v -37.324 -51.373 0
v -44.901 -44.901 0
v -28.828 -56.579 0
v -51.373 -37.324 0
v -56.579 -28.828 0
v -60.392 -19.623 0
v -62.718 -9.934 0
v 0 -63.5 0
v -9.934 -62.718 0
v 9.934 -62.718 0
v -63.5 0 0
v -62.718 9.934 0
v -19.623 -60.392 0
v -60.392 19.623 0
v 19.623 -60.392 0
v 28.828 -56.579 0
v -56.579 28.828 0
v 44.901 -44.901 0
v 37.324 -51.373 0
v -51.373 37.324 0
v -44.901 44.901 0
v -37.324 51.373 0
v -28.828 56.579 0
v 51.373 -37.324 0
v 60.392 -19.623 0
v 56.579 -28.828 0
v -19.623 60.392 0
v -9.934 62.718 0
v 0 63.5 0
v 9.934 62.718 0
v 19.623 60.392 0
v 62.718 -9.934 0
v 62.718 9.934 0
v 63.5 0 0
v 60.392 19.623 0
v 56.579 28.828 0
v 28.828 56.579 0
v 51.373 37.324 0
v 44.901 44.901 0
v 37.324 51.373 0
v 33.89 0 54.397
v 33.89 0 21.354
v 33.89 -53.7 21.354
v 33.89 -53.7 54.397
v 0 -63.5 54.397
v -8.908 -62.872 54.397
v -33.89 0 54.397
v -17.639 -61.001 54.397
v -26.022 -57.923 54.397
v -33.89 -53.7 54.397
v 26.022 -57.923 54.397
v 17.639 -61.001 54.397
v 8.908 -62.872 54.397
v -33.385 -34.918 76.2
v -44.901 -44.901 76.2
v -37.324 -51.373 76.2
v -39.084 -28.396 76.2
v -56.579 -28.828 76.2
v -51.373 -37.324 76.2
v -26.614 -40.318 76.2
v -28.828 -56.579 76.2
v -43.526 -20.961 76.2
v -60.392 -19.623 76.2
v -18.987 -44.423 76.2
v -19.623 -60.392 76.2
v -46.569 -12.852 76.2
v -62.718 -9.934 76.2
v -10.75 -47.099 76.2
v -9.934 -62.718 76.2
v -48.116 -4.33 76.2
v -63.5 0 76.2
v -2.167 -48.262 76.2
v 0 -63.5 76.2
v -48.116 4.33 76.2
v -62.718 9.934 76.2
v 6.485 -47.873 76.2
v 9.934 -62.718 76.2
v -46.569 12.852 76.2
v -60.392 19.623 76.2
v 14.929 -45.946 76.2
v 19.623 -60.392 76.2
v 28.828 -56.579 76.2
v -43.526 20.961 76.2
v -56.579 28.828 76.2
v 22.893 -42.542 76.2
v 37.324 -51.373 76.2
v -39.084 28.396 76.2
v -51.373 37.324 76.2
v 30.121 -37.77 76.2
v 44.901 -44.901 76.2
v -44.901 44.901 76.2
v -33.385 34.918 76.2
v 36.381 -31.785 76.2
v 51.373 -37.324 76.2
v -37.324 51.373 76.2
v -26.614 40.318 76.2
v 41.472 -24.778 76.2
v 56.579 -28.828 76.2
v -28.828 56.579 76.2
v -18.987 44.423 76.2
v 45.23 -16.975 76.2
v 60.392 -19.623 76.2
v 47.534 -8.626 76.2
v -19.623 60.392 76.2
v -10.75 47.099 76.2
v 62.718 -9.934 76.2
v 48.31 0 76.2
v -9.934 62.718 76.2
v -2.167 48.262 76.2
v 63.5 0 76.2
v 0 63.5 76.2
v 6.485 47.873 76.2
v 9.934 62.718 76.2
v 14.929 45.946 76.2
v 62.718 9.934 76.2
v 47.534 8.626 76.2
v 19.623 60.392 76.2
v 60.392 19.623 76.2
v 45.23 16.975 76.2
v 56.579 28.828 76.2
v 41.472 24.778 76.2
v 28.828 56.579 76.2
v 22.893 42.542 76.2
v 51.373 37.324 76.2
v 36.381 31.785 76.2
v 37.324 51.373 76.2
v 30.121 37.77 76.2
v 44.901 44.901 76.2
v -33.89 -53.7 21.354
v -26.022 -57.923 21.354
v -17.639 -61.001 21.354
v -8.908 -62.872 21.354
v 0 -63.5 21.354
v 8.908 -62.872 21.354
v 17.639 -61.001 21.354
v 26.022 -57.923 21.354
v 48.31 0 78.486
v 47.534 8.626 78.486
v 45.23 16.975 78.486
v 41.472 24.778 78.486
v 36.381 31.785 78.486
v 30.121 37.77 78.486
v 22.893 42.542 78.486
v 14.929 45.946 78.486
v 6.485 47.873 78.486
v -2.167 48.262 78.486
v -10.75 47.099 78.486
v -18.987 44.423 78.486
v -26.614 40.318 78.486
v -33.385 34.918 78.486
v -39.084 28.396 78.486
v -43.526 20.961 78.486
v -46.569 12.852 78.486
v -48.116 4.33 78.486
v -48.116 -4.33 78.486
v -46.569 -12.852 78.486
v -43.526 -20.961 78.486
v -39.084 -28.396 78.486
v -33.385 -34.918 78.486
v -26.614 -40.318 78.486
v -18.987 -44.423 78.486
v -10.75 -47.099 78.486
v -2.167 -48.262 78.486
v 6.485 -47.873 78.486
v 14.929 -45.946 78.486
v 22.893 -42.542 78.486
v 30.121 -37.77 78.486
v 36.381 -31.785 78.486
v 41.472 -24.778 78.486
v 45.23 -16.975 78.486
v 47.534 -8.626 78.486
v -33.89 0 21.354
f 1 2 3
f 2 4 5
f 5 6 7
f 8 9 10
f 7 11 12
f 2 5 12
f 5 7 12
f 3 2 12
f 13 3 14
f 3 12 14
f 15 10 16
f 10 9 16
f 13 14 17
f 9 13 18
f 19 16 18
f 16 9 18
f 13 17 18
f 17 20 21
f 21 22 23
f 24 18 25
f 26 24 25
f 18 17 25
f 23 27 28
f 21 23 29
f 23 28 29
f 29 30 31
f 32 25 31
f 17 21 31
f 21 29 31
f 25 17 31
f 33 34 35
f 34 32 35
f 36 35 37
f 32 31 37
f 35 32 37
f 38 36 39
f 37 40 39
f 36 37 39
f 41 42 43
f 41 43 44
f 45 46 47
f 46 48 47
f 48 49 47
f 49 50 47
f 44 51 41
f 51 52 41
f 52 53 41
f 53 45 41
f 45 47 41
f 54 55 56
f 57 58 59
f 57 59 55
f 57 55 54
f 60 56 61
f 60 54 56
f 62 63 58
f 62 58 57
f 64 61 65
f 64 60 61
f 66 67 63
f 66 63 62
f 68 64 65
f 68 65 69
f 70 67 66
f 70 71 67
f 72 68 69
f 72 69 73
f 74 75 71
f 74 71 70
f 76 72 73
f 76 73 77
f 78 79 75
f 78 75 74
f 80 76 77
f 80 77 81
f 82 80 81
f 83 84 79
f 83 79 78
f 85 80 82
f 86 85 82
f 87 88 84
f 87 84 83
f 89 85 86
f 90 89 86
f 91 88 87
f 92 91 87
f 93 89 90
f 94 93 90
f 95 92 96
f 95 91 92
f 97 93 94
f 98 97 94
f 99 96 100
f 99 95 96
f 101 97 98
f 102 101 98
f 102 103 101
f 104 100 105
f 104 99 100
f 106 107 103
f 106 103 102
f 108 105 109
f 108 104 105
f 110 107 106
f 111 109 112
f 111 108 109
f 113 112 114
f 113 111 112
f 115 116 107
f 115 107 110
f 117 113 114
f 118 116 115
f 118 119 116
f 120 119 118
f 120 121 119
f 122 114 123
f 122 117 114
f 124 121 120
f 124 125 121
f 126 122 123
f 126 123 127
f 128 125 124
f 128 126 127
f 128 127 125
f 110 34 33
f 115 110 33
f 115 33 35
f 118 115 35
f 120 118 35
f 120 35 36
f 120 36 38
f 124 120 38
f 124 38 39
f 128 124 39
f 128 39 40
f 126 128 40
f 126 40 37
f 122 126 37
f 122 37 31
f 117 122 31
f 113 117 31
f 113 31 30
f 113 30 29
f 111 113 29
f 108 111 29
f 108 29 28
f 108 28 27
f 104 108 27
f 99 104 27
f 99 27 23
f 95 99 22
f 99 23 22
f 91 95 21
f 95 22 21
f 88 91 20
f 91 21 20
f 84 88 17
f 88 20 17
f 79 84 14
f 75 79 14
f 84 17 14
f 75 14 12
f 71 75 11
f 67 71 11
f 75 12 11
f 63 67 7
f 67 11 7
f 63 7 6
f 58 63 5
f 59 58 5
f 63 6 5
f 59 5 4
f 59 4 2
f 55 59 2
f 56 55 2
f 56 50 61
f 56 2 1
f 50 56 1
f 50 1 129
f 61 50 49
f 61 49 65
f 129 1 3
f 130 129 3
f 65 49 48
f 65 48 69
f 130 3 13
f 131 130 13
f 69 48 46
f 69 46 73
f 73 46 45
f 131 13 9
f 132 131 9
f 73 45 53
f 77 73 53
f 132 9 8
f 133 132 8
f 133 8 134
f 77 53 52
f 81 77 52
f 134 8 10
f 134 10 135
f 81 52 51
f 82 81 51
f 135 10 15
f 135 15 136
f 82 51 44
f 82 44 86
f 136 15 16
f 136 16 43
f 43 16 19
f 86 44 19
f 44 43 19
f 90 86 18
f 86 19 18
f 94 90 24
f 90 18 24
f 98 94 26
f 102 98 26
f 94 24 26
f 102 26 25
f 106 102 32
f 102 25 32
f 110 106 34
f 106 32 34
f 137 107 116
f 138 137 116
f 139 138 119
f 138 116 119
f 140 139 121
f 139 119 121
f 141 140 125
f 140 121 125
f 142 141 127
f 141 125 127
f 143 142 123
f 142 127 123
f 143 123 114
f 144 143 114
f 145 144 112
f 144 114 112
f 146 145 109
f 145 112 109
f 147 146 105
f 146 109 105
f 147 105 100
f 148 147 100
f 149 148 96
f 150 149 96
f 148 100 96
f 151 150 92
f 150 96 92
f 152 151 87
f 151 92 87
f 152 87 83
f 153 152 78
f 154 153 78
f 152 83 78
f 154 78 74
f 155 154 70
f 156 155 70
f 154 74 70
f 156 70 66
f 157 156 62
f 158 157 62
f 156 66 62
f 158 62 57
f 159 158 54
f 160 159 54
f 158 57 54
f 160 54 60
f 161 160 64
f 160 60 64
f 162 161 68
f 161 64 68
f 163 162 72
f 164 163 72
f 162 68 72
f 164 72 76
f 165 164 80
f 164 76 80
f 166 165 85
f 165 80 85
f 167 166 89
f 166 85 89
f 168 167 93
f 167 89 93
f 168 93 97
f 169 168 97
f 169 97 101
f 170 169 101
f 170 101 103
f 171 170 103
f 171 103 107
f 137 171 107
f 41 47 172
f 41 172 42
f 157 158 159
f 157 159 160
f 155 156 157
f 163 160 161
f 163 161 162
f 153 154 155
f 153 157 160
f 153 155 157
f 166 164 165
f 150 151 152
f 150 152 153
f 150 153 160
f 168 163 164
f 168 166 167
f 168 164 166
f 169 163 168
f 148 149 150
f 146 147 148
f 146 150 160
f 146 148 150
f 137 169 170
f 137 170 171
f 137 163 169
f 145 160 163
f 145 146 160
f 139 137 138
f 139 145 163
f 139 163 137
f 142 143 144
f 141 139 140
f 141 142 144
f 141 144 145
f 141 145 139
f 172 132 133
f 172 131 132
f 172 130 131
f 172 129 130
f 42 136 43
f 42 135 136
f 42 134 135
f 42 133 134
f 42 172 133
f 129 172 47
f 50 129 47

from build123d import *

# Parameters (mm, degrees)
F0_R     = 63.5
F1_DEPTH = 76.2
F3_R     = 48.310271
F4_DEPTH = 2.286
F5_W     = 67.779378
F5_H     = 33.0435
F6_DEPTH = 127


with BuildPart() as f1:
    # F0 (on Top) → F1 (new body)
    with BuildSketch(Plane.XY):
        Circle(F0_R)
    extrude(amount=F1_DEPTH)

    # F3 (on face) → F4 (join)
    with BuildSketch(Plane.XY.offset(76.2)):
        Circle(F3_R)
    extrude(amount=F4_DEPTH)

    # F5 (on Front) → F6 (cut)
    with BuildSketch(Plane.XZ):
        with Locations((0, 37.875455)):
            Rectangle(F5_W, F5_H)
    extrude(amount=F6_DEPTH, mode=Mode.SUBTRACT)


solid = f1.part
